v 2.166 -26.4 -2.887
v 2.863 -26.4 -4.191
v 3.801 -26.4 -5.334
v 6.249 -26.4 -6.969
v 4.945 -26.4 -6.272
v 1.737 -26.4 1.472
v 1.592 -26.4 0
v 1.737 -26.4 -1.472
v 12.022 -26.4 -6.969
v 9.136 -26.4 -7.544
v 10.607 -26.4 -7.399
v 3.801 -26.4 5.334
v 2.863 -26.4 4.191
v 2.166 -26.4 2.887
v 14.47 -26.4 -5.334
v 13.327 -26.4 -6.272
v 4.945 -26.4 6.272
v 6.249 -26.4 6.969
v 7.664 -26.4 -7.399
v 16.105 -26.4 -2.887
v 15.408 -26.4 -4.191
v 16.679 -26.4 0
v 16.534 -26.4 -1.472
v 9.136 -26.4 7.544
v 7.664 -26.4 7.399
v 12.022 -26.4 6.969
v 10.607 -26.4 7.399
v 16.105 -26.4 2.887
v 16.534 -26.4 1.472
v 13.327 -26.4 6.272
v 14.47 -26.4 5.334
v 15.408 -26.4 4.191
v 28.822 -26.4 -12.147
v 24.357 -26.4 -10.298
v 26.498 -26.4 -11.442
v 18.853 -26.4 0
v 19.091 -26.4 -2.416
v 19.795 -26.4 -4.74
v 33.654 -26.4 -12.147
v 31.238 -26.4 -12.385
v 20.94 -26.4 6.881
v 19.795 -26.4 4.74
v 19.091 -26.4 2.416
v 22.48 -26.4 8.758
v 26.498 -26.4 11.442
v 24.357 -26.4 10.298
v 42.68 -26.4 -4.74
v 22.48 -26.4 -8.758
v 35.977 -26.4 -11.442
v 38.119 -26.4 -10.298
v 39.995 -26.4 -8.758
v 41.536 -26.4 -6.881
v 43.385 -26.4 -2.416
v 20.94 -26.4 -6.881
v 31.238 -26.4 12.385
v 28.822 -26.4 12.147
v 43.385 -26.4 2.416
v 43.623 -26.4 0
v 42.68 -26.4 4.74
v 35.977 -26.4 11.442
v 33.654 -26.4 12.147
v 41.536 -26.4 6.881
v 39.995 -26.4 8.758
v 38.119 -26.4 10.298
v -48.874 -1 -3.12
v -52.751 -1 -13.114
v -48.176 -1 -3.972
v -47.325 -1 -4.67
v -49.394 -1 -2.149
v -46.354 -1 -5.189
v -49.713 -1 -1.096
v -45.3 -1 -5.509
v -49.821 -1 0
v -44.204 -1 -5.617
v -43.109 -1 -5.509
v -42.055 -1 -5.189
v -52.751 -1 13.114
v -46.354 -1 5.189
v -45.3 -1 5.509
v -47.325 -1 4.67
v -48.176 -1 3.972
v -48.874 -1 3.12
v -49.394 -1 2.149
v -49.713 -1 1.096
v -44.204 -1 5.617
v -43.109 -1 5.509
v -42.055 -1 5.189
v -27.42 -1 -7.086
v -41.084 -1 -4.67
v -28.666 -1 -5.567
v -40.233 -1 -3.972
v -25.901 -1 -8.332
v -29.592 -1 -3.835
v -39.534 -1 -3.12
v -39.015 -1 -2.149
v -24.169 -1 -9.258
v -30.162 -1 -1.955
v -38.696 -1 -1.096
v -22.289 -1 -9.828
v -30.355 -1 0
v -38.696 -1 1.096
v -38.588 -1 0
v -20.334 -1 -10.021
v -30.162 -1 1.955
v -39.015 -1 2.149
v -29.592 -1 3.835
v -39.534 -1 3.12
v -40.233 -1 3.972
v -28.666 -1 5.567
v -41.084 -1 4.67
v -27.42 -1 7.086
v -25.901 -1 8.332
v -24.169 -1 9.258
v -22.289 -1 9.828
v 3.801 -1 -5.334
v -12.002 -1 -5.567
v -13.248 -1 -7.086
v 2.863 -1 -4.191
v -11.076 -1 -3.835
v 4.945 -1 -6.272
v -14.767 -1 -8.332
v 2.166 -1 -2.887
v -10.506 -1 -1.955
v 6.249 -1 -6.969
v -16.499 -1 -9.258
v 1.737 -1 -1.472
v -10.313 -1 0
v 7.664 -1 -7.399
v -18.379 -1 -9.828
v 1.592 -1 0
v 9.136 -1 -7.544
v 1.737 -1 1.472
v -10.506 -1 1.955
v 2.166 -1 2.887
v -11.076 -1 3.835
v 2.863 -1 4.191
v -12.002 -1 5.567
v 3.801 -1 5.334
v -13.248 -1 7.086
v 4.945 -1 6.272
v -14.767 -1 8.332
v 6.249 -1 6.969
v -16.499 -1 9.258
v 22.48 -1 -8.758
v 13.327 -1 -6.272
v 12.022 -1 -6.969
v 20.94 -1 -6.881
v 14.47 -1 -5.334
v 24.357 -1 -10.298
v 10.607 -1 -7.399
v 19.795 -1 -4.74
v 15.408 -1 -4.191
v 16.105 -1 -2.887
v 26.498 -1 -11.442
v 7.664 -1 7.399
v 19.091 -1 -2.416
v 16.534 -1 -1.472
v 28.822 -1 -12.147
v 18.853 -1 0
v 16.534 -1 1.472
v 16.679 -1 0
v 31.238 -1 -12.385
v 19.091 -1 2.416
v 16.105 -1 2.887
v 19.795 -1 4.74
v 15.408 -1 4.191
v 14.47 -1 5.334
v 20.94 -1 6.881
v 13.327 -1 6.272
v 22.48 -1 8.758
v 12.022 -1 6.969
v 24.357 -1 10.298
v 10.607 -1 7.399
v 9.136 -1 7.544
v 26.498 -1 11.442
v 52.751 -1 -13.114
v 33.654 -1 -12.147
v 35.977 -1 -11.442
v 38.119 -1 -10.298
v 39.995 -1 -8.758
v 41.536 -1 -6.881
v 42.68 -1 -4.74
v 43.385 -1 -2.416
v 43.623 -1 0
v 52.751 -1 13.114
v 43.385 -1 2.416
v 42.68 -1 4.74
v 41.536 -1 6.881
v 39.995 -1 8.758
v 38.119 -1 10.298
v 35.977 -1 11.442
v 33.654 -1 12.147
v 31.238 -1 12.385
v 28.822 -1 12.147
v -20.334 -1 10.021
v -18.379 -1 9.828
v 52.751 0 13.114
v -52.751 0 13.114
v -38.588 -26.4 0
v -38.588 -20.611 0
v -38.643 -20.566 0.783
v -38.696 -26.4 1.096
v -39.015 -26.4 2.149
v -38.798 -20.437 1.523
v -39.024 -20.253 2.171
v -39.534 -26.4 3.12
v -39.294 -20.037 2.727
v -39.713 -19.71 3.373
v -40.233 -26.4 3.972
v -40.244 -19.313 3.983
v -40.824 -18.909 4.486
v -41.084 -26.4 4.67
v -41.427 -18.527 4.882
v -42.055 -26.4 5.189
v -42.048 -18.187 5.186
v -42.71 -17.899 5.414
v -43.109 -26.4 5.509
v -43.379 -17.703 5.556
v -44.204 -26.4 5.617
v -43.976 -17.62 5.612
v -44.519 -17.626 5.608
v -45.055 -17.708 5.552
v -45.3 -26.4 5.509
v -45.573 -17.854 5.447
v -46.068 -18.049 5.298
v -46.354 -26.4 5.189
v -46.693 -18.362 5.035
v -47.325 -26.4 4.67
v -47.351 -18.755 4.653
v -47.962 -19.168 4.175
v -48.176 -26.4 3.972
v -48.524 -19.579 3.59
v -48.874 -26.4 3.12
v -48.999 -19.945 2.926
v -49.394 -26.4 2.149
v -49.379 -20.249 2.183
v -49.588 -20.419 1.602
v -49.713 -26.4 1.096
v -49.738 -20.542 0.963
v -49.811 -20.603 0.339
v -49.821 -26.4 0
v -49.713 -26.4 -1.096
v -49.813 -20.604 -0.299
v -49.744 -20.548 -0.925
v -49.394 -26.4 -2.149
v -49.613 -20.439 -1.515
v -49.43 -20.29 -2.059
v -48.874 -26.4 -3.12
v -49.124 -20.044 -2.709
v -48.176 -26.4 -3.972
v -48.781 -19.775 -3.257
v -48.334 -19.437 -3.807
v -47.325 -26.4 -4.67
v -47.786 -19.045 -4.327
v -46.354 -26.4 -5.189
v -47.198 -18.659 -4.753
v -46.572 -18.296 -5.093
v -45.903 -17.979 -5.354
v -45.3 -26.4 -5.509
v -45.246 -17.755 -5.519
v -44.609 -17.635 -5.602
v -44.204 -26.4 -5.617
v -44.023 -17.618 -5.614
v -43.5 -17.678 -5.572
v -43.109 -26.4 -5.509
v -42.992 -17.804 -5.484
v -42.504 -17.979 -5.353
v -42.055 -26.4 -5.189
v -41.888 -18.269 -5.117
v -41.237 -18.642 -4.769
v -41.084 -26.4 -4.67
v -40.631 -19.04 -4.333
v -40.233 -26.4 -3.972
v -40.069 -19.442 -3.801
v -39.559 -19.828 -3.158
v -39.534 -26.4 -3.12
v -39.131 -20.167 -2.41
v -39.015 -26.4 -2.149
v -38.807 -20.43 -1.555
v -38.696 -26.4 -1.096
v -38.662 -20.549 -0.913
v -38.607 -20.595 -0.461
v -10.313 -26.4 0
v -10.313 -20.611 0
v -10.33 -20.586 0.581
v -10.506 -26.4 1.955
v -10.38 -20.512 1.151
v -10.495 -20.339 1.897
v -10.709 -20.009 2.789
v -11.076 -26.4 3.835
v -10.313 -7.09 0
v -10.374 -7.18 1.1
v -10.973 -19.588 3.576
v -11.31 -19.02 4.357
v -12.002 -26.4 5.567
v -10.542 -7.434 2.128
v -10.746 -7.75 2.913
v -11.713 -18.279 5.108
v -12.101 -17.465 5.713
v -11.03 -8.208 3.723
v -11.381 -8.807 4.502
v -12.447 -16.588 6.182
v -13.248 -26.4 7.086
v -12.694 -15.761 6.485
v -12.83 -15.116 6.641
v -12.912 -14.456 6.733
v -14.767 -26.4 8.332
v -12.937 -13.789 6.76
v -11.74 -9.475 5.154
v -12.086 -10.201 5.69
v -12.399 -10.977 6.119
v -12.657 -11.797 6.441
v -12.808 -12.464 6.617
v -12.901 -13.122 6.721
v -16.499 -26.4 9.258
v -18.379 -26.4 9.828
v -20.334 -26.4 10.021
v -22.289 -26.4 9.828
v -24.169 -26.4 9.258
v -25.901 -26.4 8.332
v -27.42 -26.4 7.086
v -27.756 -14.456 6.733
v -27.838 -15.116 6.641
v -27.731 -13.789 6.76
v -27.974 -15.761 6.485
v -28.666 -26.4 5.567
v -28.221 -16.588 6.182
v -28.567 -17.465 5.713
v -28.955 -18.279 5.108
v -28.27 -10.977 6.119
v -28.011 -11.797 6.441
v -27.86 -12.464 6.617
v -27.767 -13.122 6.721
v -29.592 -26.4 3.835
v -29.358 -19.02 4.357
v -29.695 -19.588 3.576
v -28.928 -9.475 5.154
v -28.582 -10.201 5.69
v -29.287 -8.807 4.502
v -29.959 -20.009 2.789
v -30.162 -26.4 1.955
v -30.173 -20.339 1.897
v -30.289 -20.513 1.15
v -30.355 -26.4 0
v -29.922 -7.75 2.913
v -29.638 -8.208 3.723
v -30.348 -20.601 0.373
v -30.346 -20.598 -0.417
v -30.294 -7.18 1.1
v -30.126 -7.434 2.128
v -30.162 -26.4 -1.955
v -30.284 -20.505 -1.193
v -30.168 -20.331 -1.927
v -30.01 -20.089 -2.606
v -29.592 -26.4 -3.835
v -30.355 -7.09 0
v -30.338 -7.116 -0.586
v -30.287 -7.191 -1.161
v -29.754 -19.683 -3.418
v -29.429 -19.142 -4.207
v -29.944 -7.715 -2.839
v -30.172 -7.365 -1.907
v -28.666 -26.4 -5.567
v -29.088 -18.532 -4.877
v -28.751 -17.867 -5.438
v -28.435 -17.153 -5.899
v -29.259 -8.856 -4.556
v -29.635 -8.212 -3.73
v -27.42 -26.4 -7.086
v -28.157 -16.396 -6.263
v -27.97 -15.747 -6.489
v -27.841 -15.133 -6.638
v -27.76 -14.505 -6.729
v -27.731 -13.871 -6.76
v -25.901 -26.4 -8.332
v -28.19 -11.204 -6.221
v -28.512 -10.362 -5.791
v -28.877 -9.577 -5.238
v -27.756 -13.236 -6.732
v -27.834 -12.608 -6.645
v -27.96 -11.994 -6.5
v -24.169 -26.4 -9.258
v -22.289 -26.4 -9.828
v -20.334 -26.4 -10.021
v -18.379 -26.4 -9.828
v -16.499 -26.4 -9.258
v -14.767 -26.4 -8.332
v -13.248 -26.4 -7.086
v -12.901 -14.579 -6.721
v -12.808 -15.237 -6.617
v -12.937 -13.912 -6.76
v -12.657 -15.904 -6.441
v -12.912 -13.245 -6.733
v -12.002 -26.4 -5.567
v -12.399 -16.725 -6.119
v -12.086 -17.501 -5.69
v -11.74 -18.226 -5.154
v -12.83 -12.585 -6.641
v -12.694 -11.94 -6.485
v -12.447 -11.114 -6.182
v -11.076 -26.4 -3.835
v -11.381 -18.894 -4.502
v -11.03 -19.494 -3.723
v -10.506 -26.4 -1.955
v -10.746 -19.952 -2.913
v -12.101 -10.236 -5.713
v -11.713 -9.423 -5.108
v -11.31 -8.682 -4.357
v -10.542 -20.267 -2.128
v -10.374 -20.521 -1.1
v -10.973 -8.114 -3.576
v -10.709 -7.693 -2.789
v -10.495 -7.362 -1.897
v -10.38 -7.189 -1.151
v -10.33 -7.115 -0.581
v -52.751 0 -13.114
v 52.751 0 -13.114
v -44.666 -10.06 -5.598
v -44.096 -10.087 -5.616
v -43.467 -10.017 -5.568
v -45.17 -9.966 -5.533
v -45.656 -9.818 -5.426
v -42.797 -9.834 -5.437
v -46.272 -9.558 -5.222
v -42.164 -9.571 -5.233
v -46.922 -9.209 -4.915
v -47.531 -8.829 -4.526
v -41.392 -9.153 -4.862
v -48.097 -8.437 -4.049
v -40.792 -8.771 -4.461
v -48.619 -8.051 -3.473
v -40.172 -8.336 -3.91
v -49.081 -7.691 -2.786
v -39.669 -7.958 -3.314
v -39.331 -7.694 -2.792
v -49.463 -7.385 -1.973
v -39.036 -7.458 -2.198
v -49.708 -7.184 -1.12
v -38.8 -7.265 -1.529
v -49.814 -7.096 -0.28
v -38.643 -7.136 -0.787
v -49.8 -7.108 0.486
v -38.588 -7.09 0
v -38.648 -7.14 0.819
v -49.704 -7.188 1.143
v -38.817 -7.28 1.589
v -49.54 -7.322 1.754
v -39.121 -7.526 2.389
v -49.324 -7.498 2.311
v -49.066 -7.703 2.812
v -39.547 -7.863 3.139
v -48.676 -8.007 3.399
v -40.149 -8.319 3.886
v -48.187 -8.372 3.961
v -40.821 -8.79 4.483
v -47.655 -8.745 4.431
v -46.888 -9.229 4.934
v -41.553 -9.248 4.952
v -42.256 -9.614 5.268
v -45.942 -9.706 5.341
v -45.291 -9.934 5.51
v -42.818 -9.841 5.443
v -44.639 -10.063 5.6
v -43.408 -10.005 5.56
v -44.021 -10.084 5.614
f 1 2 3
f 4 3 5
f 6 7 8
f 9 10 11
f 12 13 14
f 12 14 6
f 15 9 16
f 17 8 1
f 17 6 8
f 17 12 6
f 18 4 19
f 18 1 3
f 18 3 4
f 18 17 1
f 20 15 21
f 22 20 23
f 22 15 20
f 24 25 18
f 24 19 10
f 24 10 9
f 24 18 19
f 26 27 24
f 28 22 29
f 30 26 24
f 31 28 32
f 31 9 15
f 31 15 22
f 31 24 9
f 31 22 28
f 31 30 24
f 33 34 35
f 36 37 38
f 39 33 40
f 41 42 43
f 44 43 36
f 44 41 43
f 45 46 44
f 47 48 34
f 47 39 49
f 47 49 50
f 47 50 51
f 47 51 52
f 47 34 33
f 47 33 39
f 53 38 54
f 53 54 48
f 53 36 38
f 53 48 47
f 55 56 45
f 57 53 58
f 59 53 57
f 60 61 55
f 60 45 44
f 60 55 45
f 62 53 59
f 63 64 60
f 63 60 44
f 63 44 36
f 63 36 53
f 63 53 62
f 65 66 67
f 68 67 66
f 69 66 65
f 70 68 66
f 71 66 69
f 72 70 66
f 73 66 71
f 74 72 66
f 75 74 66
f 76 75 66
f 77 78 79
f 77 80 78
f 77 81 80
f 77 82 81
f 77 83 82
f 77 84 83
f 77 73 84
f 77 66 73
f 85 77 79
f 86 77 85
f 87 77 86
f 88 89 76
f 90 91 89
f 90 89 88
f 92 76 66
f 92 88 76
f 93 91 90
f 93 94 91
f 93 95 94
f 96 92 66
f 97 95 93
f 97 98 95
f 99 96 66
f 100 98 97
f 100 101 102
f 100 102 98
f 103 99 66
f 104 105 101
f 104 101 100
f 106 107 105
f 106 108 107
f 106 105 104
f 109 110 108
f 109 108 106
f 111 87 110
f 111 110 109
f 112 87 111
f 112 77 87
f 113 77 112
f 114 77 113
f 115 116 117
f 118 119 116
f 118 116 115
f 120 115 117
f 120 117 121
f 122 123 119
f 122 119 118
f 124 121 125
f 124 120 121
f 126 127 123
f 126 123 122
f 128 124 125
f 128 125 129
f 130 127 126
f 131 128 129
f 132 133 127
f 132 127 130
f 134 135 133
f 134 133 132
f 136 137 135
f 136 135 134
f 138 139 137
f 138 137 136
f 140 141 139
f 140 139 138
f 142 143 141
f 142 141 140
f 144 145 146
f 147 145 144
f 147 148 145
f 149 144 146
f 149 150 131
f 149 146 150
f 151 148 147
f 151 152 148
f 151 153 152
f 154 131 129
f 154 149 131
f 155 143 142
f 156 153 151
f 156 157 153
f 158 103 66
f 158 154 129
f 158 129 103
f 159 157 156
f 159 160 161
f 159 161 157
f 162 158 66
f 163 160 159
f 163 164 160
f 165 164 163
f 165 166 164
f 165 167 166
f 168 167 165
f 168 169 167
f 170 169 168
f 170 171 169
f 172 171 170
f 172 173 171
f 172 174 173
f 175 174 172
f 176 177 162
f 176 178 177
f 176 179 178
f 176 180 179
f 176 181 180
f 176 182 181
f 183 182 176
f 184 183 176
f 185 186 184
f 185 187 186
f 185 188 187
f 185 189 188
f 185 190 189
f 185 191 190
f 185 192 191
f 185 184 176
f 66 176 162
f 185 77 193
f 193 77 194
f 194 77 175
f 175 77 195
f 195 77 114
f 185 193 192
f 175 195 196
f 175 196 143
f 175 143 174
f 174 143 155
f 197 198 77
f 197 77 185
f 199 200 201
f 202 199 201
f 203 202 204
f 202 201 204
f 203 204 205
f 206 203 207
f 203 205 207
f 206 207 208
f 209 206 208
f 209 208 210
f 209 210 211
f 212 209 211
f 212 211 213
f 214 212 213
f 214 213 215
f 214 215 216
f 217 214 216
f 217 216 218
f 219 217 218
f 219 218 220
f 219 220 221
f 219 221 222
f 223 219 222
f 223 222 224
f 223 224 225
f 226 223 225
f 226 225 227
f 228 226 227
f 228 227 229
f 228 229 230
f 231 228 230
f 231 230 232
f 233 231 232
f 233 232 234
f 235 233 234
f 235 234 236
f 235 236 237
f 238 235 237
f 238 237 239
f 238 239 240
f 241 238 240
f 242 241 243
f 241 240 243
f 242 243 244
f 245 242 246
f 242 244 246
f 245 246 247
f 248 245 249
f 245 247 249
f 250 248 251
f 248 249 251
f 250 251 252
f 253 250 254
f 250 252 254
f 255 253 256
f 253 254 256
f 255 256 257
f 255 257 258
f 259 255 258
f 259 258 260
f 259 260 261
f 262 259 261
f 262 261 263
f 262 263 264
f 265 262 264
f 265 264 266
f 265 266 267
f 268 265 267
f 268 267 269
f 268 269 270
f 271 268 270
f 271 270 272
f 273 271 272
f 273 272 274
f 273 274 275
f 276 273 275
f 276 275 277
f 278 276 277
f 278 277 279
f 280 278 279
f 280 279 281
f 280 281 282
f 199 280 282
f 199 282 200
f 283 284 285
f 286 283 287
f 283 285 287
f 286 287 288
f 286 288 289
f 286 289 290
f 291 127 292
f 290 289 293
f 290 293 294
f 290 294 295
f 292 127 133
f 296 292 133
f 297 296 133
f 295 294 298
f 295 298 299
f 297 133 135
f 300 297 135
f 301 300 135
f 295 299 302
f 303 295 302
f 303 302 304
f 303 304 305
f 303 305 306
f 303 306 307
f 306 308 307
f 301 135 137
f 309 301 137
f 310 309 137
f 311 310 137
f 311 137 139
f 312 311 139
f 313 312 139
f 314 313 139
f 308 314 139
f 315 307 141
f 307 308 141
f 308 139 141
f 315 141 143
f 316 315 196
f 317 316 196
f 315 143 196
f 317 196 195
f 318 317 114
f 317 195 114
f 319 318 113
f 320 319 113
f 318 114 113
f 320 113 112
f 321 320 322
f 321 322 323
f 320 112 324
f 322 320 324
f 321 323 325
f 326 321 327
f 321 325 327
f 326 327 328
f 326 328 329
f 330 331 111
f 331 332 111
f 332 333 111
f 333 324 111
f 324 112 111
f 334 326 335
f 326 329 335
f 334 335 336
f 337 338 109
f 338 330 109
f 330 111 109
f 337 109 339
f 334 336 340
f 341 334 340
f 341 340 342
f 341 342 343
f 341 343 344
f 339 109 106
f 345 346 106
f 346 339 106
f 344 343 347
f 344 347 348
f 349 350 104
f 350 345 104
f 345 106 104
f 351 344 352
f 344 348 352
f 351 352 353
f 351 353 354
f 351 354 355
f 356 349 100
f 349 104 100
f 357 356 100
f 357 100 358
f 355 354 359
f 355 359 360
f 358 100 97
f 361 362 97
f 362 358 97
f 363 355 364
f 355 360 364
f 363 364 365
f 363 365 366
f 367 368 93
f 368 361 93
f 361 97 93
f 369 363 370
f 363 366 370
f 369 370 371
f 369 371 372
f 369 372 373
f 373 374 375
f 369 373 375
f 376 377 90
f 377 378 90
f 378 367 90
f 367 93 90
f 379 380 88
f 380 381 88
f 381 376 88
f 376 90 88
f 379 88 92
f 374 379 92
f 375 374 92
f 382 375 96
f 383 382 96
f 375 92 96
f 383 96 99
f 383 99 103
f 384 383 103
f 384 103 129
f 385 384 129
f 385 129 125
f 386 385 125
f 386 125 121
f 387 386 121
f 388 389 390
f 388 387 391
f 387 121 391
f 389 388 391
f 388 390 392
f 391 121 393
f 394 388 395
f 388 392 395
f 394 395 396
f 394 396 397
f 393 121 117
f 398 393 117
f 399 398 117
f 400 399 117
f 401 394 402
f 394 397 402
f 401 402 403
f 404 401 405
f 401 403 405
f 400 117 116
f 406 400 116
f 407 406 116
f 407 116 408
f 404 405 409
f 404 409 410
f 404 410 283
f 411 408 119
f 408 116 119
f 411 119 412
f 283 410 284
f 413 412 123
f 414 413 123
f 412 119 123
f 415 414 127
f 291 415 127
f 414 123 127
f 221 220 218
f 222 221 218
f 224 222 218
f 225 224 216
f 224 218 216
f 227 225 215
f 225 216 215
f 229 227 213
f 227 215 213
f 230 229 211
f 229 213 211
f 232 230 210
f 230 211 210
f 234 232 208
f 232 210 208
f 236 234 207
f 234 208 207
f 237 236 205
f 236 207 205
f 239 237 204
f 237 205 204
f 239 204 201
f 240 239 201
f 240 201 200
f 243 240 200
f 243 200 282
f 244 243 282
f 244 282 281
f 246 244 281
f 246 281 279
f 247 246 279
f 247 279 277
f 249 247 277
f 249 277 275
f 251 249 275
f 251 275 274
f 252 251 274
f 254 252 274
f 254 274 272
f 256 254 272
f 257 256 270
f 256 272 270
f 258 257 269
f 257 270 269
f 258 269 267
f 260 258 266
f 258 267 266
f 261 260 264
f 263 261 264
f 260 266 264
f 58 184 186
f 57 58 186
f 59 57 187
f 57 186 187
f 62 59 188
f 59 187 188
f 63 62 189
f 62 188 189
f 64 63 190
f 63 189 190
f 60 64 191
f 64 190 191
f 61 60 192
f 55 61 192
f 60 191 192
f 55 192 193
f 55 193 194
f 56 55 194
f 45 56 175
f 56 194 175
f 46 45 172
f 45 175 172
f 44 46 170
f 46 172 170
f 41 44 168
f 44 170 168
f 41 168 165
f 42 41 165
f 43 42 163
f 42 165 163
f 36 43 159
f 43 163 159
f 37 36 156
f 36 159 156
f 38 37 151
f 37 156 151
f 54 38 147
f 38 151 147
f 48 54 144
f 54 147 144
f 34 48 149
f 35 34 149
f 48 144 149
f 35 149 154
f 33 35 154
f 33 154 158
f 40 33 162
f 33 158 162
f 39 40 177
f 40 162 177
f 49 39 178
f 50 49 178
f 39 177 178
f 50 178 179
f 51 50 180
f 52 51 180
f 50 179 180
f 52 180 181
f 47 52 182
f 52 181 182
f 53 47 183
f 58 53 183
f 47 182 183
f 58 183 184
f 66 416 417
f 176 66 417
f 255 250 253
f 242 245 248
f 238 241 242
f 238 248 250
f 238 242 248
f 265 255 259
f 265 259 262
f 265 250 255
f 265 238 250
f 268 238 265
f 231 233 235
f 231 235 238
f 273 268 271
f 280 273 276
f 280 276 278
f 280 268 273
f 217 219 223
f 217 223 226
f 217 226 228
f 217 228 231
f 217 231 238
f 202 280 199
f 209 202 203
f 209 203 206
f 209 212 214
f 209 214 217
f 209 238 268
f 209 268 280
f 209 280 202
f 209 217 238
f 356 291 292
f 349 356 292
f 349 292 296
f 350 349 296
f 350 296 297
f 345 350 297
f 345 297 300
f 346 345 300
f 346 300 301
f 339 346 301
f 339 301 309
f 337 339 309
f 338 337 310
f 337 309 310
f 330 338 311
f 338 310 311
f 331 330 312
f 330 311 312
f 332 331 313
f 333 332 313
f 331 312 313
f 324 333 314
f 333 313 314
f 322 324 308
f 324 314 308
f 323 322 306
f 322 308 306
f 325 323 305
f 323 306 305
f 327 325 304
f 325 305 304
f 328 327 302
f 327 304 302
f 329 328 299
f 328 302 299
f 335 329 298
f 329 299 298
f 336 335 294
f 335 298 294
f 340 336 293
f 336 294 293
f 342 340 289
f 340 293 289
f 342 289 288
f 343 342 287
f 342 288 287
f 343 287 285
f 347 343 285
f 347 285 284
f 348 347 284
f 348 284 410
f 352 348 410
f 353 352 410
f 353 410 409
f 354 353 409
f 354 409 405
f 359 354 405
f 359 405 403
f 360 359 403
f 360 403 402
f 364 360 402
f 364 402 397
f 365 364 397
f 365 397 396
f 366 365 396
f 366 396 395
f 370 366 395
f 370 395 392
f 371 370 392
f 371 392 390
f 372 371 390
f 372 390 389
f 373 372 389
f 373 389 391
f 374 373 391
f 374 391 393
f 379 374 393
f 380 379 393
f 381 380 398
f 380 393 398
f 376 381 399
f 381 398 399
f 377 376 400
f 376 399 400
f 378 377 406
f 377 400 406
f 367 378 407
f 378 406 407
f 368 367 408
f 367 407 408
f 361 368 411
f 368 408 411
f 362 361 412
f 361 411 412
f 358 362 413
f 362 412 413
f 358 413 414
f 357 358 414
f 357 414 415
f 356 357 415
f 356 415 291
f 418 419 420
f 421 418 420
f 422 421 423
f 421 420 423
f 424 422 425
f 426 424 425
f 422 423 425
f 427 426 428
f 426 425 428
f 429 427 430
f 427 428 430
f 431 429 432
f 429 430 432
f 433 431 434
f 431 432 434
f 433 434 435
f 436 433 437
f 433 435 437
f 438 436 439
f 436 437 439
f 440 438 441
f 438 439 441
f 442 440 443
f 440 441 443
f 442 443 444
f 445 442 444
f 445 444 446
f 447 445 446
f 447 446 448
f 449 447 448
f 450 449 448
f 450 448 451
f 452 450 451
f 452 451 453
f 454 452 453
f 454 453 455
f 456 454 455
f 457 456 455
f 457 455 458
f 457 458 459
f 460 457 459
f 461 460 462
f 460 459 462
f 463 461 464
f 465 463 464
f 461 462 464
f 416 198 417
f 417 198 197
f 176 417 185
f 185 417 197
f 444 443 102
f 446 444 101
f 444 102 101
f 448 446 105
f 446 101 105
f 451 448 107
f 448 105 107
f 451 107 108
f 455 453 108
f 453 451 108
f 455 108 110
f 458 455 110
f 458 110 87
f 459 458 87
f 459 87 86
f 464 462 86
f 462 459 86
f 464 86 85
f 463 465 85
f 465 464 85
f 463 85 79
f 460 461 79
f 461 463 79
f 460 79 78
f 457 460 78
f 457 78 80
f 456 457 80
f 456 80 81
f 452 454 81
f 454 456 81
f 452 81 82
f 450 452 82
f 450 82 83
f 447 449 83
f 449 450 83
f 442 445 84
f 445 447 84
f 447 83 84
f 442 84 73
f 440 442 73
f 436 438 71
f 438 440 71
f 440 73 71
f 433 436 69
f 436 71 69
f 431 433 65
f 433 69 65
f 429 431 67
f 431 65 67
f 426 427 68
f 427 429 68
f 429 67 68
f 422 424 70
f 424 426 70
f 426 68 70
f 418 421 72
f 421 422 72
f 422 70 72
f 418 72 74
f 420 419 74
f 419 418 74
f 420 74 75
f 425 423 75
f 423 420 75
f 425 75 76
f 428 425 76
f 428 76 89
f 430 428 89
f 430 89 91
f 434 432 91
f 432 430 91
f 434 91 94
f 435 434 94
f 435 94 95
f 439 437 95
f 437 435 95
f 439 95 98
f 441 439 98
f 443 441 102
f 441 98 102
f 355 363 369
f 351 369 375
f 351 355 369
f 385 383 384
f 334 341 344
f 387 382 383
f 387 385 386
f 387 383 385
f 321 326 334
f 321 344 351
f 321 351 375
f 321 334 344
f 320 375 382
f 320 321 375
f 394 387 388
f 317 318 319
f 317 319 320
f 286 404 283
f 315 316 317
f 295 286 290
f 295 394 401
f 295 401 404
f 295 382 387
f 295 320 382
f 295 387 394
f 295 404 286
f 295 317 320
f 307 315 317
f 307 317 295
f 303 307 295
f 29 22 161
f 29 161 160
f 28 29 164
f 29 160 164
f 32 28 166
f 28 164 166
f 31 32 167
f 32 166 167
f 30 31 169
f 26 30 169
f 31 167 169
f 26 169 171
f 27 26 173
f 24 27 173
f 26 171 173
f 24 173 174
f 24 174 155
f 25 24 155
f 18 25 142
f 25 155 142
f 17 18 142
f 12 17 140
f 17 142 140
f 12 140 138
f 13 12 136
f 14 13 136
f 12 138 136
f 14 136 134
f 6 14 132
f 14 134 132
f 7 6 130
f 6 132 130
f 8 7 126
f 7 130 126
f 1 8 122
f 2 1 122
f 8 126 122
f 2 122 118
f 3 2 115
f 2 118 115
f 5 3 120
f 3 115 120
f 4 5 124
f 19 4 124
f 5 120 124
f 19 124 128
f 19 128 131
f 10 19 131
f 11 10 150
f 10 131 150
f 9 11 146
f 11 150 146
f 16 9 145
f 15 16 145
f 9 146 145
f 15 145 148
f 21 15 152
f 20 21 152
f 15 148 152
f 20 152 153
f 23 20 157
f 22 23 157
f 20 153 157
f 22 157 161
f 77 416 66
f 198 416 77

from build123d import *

# Parameters (mm, degrees)
F0_W     = 105.501212
F0_H     = 26.227956
F1_DEPTH = 1
F2_R     = 5.616649
F2_R_2   = 10.02075
F2_R_3   = 7.543587
F2_R_4   = 12.385123
F3_DEPTH = 25.4
F4_R     = 6.76037
F5_DEPTH = 99.568


with BuildPart() as f1:
    # F0 (on Front) → F1 (new body)
    with BuildSketch(Plane.XZ):
        Rectangle(F0_W, F0_H)
    extrude(amount=F1_DEPTH)

    # F2 (on face) → F3 (join)
    with BuildSketch(Plane.XZ.offset(1)):
        with Locations((-44.204421, 0)):
            Circle(F2_R)
        with Locations((-20.334031, 0)):
            Circle(F2_R_2)
        with Locations((9.135582, 0)):
            Circle(F2_R_3)
        with Locations((31.237792, 0)):
            Circle(F2_R_4)
    extrude(amount=F3_DEPTH)

    # F4 (on Right) → F5 (cut)
    with BuildSketch(Plane.YZ):
        with Locations((-13.850718, 0)):
            Circle(F4_R)
    extrude(amount=-F5_DEPTH, mode=Mode.SUBTRACT)


solid = f1.part
